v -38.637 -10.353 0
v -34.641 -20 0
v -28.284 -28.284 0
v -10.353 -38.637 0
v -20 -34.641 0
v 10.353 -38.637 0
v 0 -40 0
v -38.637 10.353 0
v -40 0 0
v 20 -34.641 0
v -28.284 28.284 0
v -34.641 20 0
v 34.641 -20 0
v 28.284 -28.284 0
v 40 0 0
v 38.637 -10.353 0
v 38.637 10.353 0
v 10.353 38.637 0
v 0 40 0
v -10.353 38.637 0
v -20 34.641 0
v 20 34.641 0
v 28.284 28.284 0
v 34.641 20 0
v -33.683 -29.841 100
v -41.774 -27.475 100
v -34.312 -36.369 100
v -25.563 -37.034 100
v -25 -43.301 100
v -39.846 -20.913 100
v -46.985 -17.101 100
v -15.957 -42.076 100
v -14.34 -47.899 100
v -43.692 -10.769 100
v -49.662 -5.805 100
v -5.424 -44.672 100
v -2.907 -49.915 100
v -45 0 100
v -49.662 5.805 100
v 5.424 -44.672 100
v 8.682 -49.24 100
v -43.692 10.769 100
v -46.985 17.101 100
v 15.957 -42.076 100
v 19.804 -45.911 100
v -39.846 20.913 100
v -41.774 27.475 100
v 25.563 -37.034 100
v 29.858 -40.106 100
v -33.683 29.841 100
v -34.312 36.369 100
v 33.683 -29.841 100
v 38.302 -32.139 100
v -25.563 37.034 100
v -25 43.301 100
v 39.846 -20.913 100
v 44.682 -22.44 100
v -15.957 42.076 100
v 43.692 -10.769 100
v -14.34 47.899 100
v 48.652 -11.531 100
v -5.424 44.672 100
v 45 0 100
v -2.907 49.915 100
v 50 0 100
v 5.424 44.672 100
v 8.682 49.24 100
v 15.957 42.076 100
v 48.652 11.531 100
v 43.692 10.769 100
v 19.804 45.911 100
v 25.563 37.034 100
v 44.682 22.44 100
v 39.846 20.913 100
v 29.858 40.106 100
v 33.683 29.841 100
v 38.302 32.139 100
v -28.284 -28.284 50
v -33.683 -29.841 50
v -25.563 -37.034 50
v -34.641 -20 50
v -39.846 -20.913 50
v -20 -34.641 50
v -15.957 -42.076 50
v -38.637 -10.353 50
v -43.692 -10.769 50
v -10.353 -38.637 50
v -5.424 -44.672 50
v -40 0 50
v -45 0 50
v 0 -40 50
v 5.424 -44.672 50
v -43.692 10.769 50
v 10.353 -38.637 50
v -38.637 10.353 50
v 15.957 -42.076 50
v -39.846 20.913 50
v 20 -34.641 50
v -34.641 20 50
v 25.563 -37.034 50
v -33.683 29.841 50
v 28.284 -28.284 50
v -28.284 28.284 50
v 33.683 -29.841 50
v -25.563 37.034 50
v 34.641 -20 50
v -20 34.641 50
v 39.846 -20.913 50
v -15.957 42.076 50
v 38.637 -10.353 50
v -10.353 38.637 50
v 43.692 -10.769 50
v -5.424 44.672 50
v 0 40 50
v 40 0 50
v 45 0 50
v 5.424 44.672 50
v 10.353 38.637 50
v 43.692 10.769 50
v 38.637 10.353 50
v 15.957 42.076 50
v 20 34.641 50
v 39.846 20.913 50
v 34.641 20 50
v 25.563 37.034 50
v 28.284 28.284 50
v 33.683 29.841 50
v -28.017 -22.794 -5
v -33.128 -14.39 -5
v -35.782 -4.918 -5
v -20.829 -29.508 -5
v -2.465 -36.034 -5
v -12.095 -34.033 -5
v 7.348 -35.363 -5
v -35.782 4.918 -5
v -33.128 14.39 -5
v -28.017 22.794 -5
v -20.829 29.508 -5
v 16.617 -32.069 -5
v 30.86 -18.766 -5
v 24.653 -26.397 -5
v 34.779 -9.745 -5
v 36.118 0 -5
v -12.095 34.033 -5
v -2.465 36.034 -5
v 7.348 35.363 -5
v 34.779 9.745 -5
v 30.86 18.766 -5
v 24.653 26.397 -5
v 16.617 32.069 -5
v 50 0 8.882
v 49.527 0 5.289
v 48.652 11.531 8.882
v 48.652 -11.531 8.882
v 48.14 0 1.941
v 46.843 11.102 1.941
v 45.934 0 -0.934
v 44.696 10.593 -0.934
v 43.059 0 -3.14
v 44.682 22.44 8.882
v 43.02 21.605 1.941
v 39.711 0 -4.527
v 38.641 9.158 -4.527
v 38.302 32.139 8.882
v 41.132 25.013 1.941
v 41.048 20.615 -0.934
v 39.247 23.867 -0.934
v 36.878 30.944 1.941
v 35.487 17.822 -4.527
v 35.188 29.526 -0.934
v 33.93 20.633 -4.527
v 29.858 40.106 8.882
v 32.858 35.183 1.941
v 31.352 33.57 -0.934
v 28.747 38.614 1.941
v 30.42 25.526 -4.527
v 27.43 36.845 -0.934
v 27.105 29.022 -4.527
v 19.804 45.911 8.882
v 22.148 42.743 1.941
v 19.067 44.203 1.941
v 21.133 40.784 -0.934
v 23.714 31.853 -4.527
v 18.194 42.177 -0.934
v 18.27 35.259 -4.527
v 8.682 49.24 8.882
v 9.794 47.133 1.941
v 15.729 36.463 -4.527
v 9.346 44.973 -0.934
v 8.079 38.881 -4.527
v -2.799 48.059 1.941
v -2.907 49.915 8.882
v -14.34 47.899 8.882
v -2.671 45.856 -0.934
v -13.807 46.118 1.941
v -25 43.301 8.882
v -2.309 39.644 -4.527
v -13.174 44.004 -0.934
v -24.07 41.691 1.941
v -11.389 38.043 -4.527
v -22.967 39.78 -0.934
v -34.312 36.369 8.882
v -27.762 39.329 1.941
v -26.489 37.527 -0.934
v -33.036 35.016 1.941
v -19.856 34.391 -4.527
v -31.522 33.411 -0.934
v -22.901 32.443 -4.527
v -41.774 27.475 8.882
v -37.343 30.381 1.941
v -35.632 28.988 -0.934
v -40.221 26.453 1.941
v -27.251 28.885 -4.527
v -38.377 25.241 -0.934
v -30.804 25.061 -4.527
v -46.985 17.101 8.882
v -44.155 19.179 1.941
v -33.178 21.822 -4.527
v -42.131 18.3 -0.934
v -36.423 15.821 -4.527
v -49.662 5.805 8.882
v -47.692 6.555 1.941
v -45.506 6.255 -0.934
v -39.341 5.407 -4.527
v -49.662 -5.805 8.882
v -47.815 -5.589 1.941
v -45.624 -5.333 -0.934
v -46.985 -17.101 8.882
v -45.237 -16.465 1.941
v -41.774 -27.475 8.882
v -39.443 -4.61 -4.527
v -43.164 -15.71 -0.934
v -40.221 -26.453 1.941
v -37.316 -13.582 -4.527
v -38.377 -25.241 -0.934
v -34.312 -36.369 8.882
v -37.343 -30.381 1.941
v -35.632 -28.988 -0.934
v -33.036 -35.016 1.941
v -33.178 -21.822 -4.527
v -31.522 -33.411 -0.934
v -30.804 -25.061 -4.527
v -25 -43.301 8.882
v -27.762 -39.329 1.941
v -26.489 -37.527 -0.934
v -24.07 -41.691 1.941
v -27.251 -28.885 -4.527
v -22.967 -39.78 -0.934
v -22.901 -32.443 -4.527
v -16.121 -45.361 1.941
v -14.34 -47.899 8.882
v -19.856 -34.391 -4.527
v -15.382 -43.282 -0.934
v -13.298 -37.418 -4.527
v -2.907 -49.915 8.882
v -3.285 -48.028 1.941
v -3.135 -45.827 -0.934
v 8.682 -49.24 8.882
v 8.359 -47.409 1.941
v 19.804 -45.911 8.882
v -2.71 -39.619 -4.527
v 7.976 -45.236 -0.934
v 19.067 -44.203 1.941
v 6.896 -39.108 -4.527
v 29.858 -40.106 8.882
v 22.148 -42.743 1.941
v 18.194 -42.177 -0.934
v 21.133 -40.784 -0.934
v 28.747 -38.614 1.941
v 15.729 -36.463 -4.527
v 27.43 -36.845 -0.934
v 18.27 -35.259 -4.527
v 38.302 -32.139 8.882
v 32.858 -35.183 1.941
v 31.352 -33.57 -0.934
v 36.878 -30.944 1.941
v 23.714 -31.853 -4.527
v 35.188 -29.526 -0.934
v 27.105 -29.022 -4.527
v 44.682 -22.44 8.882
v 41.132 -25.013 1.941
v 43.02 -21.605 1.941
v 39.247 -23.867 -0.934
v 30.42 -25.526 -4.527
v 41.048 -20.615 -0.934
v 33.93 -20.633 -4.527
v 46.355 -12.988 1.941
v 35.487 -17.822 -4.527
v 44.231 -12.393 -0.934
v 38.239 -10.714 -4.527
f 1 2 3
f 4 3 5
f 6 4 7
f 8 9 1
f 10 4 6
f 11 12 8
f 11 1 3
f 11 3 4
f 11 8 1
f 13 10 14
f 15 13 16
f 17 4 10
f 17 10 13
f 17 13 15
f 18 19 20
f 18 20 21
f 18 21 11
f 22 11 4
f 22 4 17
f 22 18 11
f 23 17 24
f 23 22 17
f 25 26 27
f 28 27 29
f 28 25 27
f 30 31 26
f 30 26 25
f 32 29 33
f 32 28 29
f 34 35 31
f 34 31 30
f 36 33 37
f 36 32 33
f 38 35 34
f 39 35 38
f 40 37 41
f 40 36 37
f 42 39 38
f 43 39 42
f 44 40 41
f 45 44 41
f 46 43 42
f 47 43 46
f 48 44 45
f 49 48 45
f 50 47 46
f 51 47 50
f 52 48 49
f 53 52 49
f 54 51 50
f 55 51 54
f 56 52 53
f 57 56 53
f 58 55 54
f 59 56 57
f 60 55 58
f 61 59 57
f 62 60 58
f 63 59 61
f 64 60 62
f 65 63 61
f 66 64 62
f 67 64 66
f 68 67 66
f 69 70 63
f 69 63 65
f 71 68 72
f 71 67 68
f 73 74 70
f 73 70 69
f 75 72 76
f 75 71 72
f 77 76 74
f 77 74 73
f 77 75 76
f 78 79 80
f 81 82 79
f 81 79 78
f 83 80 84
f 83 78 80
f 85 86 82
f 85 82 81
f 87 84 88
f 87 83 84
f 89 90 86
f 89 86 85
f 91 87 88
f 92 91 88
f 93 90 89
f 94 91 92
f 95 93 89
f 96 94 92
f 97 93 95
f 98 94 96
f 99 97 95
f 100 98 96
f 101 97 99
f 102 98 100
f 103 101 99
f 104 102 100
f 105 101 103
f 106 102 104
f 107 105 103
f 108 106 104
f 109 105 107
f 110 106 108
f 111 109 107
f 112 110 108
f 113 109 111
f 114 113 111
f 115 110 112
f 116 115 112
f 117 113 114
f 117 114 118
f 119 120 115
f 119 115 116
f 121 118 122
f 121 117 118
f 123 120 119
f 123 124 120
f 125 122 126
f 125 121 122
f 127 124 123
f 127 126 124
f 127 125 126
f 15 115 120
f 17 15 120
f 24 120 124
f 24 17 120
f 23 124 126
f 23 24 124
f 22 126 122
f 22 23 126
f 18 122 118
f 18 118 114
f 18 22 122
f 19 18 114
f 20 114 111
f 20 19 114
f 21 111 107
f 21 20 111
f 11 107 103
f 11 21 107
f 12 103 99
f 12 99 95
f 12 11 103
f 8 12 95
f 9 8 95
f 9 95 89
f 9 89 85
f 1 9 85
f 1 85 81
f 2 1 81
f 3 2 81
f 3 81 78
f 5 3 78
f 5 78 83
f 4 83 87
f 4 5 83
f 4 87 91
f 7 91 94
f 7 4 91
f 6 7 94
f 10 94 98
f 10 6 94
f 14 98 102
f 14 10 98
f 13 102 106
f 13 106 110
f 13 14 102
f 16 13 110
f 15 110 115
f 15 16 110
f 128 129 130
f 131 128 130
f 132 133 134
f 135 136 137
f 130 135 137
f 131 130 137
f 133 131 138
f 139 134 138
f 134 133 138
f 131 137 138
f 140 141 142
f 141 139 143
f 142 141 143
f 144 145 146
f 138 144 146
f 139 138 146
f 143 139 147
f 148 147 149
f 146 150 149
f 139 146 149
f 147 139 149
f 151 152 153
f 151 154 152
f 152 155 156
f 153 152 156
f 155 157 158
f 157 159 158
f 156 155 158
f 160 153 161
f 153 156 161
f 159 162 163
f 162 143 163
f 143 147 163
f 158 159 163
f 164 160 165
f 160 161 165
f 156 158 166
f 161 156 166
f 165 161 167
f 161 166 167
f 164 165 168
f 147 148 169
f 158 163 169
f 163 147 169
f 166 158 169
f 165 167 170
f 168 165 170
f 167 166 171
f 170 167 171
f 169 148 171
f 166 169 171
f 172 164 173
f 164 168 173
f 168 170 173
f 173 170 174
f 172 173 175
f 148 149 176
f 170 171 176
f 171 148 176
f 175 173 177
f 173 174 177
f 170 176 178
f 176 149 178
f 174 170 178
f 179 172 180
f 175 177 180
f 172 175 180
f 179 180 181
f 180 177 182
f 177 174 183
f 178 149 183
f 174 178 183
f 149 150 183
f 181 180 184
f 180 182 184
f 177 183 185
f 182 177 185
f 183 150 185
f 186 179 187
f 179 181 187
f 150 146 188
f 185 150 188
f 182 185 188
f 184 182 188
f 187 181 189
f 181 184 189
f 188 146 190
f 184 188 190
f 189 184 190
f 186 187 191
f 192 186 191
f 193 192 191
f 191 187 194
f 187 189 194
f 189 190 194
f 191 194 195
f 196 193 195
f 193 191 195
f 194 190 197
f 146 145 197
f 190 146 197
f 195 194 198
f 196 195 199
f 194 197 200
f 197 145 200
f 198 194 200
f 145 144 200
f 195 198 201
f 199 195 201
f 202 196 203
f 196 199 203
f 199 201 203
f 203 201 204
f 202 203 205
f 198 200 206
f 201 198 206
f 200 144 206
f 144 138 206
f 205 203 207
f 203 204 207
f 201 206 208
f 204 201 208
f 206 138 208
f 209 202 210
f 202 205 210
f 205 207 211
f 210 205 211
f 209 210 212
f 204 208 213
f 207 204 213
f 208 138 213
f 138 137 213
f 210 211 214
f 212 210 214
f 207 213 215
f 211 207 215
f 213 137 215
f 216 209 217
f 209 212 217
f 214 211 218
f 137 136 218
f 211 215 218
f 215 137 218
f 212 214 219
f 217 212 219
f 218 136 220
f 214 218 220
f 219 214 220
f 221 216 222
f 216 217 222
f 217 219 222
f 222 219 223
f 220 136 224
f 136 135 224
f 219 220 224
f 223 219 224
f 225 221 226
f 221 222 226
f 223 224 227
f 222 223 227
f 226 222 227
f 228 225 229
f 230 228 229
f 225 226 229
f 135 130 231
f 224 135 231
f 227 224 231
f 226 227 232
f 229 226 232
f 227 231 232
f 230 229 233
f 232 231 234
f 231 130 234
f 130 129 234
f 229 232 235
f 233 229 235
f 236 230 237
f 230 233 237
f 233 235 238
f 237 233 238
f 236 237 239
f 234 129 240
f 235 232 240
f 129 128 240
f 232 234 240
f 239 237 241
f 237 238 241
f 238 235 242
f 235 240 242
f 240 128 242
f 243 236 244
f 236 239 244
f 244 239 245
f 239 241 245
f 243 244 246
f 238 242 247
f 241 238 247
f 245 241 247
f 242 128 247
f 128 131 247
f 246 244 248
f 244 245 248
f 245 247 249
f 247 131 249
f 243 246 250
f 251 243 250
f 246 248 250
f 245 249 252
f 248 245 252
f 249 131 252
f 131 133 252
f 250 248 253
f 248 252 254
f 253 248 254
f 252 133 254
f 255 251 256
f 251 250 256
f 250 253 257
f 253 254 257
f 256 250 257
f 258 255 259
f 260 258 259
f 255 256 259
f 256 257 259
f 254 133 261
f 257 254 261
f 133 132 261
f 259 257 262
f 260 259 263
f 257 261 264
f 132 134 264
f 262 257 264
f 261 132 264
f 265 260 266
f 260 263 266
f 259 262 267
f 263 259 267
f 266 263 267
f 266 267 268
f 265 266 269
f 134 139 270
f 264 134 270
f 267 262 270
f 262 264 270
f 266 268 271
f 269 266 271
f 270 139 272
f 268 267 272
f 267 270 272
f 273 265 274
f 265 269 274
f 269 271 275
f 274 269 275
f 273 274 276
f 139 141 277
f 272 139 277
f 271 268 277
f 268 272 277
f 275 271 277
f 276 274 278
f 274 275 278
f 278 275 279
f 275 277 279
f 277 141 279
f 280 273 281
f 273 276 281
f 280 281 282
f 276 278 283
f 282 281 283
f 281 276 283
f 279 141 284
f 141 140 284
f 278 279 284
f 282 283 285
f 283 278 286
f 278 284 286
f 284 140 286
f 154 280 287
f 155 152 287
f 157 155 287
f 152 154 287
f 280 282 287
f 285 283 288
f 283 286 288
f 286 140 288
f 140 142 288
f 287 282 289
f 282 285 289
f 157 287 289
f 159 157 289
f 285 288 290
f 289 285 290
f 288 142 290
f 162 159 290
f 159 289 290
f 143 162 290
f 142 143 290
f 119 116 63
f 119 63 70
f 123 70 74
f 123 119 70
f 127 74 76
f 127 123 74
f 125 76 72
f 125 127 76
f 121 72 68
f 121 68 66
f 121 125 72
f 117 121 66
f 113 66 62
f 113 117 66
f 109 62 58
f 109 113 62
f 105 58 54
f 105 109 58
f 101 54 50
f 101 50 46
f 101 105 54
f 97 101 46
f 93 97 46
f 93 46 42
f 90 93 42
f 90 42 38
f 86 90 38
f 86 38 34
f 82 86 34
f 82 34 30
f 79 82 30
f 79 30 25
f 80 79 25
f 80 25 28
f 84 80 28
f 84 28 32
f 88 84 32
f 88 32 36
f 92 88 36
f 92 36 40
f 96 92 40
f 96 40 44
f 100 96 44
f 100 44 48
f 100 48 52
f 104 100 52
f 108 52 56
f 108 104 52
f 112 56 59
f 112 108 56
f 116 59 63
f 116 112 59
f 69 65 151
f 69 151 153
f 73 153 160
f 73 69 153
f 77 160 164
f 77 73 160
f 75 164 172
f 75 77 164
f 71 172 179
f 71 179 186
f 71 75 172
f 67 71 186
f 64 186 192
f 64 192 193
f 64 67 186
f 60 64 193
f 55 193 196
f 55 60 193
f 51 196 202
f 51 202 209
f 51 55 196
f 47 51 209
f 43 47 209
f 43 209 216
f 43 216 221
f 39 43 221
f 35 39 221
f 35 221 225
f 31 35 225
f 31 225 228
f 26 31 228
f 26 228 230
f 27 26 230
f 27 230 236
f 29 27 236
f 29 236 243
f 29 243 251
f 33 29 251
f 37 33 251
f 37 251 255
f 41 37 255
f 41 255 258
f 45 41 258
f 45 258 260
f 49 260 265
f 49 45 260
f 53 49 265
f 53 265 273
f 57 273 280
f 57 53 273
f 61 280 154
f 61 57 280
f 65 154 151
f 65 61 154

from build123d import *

# Parameters (mm, degrees)
F0_R     = 50
F0_R_2   = 45
F1_DEPTH = 100
F0_R_3   = 40
F2_DEPTH = 5
F3_R     = 13.8817279836
F4_DEPTH = 50


with BuildPart() as f1:
    # F0 (on Top) → F1 (new body)
    with BuildSketch(Plane.XY):
        Circle(F0_R)
        Circle(F0_R_2, mode=Mode.SUBTRACT)
    extrude(amount=F1_DEPTH)

    # F0 (on Top) → F2 (join)
    with BuildSketch(Plane.XY):
        Circle(F0_R)
        Circle(F0_R_2, mode=Mode.SUBTRACT)
        Circle(F0_R_2)
        Circle(F0_R_3, mode=Mode.SUBTRACT)
        Circle(F0_R_3)
    extrude(amount=-F2_DEPTH)

    # F3
    f3_edges = [f1.edges().sort_by_distance(p)[0] for p in [
        (-50, 0, -5),
    ]]
    fillet(f3_edges, radius=F3_R)

    # F0 (on Top) → F4 (join)
    with BuildSketch(Plane.XY):
        Circle(F0_R_2)
        Circle(F0_R_3, mode=Mode.SUBTRACT)
    extrude(amount=F4_DEPTH)


solid = f1.part
